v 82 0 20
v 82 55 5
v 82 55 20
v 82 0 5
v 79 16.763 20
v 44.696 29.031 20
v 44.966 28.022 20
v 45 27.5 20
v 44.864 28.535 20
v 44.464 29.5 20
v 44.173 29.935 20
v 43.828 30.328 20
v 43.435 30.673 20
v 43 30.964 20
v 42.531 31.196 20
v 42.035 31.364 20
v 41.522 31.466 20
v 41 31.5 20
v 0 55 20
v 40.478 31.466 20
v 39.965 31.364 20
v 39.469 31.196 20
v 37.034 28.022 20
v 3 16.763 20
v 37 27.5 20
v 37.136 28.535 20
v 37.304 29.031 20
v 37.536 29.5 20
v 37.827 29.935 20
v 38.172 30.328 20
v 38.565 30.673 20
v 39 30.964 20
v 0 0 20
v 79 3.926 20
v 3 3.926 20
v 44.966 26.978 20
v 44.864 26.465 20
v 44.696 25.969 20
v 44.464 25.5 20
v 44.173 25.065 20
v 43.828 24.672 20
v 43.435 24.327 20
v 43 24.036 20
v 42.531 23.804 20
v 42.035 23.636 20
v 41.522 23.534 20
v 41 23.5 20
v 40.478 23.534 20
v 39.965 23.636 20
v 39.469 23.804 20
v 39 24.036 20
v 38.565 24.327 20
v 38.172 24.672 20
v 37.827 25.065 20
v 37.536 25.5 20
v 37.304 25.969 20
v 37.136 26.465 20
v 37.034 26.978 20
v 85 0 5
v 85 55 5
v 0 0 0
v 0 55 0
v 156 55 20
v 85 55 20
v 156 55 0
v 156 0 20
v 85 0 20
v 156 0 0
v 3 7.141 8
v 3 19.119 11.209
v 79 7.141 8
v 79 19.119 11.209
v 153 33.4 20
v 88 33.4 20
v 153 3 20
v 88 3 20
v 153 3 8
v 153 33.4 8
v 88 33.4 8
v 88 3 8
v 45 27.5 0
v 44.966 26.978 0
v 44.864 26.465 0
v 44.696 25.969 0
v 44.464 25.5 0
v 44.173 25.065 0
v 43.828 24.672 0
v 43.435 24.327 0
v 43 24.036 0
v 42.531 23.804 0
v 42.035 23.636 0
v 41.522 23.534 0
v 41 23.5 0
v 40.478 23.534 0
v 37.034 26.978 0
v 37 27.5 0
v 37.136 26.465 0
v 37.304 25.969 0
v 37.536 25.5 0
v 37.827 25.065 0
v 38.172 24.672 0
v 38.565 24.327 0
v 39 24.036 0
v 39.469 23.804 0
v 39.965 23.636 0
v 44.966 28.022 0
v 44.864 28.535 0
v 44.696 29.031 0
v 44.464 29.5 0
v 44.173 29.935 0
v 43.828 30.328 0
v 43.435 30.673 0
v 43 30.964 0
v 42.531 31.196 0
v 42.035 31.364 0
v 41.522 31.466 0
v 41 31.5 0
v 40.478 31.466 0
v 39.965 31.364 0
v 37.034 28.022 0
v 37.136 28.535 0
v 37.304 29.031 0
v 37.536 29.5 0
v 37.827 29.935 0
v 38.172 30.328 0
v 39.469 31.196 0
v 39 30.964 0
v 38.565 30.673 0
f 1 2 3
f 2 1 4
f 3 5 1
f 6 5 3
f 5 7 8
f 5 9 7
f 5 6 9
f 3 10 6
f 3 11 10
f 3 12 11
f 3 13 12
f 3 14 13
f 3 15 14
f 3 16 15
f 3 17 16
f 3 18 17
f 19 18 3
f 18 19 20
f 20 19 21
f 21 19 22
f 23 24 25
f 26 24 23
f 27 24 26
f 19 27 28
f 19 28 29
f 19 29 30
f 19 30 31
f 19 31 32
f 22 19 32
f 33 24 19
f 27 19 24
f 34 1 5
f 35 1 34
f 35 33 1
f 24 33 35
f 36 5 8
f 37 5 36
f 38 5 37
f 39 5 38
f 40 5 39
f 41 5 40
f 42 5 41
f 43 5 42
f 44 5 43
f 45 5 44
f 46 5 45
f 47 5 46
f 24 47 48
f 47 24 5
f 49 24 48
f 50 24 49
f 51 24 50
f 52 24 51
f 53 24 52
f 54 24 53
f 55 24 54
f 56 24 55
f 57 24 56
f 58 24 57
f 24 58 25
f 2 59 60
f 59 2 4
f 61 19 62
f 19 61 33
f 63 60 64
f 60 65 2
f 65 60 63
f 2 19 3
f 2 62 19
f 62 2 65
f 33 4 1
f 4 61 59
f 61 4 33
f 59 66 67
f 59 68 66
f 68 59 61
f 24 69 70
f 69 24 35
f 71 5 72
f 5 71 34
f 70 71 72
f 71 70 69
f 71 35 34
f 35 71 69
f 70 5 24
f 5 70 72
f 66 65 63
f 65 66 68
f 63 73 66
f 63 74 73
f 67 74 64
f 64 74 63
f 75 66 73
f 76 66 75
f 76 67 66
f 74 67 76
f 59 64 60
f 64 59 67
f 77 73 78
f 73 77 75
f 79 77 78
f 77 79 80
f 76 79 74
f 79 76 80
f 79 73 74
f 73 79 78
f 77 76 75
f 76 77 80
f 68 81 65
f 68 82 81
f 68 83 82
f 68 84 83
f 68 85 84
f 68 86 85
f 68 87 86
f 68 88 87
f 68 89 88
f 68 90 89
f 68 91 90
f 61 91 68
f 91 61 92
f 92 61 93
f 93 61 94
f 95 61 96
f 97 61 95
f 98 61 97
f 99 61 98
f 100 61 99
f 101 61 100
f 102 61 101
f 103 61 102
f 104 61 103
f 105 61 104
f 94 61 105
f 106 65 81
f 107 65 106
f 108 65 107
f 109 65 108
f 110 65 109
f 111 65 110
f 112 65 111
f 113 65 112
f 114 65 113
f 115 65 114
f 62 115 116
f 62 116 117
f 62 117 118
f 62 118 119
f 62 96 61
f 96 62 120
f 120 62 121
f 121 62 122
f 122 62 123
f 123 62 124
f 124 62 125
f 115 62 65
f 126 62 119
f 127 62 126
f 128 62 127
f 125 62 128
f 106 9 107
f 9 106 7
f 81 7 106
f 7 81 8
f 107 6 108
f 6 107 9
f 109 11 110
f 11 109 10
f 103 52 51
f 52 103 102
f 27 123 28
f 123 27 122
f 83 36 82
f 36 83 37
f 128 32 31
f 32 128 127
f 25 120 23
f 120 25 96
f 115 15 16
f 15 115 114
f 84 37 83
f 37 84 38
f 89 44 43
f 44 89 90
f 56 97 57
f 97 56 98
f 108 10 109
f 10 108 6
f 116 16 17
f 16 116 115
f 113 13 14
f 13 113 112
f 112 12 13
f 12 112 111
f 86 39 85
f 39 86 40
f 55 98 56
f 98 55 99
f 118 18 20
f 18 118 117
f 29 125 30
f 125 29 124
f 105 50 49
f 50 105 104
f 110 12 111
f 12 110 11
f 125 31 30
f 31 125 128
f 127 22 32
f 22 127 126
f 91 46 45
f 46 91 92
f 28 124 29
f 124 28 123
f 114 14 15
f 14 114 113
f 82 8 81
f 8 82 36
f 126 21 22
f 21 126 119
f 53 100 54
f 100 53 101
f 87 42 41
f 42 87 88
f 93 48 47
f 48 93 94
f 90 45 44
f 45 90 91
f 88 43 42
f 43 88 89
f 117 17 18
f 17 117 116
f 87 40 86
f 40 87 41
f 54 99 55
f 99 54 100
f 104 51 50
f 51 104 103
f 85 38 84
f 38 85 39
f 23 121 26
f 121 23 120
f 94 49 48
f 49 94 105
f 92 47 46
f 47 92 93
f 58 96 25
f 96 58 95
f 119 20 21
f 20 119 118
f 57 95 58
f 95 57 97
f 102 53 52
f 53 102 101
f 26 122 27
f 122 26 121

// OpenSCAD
layout = "side_by_side";
phone_width = 76;
phone_thickness = 10;
earbuds_width = 65;
earbuds_thickness = 28;
clearance = 1.2;
base_thickness = 5;
slot_depth = 15;
phone_tilt_degrees = 15;
cable_hole_enabled = true;
cable_hole_diameter = 8;
wall = 3;
gap = 3;
base_depth = 55;
debug_cavity_envelope = false;

phone_module_width = phone_width + wall * 2;
earbuds_module_width = earbuds_width + wall * 2;
function cavity_depth(item_thickness) = item_thickness + clearance * 2;
function cavity_height() = slot_depth + 1;
function holder_depth(item_thickness, tilt) = max(
    base_depth,
    wall + cavity_height() * sin(tilt) + cavity_depth(item_thickness) * cos(tilt) + wall
);

phone_holder_depth = holder_depth(phone_thickness, phone_tilt_degrees);
earbuds_holder_depth = holder_depth(earbuds_thickness, 0);
base_width = layout == "side_by_side"
    ? phone_module_width + gap + earbuds_module_width
    : max(phone_module_width, earbuds_module_width);
total_depth = layout == "side_by_side"
    ? max(phone_holder_depth, earbuds_holder_depth)
    : phone_holder_depth + gap + earbuds_holder_depth;

module cavity(item_width, item_thickness, tilt) {
    translate([wall, wall + cavity_height() * sin(tilt), wall])
    rotate([tilt, 0, 0])
        cube([item_width, cavity_depth(item_thickness), cavity_height()]);
}

module slot_holder(x, y, item_width, item_thickness, tilt, depth) {
    translate([x, y, base_thickness])
    difference() {
        cube([
            item_width + wall * 2,
            depth,
            slot_depth
        ]);
        cavity(item_width, item_thickness, tilt);
    }
}

if (debug_cavity_envelope) {
    translate([0, 0, base_thickness])
        cavity(phone_width, phone_thickness, phone_tilt_degrees);
} else {
    difference() {
        union() {
            cube([base_width, total_depth, base_thickness]);
            slot_holder(0, 0, phone_width, phone_thickness, phone_tilt_degrees, phone_holder_depth);
            if (layout == "side_by_side")
                slot_holder(phone_module_width + gap, 0, earbuds_width, earbuds_thickness, 0, earbuds_holder_depth);
            else
                slot_holder(0, phone_holder_depth + gap, earbuds_width, earbuds_thickness, 0, earbuds_holder_depth);
        }
        if (cable_hole_enabled)
            translate([phone_module_width / 2, phone_holder_depth / 2, -1])
                cylinder(h=base_thickness + slot_depth + 2, d=cable_hole_diameter, $fn=48);
    }
}
